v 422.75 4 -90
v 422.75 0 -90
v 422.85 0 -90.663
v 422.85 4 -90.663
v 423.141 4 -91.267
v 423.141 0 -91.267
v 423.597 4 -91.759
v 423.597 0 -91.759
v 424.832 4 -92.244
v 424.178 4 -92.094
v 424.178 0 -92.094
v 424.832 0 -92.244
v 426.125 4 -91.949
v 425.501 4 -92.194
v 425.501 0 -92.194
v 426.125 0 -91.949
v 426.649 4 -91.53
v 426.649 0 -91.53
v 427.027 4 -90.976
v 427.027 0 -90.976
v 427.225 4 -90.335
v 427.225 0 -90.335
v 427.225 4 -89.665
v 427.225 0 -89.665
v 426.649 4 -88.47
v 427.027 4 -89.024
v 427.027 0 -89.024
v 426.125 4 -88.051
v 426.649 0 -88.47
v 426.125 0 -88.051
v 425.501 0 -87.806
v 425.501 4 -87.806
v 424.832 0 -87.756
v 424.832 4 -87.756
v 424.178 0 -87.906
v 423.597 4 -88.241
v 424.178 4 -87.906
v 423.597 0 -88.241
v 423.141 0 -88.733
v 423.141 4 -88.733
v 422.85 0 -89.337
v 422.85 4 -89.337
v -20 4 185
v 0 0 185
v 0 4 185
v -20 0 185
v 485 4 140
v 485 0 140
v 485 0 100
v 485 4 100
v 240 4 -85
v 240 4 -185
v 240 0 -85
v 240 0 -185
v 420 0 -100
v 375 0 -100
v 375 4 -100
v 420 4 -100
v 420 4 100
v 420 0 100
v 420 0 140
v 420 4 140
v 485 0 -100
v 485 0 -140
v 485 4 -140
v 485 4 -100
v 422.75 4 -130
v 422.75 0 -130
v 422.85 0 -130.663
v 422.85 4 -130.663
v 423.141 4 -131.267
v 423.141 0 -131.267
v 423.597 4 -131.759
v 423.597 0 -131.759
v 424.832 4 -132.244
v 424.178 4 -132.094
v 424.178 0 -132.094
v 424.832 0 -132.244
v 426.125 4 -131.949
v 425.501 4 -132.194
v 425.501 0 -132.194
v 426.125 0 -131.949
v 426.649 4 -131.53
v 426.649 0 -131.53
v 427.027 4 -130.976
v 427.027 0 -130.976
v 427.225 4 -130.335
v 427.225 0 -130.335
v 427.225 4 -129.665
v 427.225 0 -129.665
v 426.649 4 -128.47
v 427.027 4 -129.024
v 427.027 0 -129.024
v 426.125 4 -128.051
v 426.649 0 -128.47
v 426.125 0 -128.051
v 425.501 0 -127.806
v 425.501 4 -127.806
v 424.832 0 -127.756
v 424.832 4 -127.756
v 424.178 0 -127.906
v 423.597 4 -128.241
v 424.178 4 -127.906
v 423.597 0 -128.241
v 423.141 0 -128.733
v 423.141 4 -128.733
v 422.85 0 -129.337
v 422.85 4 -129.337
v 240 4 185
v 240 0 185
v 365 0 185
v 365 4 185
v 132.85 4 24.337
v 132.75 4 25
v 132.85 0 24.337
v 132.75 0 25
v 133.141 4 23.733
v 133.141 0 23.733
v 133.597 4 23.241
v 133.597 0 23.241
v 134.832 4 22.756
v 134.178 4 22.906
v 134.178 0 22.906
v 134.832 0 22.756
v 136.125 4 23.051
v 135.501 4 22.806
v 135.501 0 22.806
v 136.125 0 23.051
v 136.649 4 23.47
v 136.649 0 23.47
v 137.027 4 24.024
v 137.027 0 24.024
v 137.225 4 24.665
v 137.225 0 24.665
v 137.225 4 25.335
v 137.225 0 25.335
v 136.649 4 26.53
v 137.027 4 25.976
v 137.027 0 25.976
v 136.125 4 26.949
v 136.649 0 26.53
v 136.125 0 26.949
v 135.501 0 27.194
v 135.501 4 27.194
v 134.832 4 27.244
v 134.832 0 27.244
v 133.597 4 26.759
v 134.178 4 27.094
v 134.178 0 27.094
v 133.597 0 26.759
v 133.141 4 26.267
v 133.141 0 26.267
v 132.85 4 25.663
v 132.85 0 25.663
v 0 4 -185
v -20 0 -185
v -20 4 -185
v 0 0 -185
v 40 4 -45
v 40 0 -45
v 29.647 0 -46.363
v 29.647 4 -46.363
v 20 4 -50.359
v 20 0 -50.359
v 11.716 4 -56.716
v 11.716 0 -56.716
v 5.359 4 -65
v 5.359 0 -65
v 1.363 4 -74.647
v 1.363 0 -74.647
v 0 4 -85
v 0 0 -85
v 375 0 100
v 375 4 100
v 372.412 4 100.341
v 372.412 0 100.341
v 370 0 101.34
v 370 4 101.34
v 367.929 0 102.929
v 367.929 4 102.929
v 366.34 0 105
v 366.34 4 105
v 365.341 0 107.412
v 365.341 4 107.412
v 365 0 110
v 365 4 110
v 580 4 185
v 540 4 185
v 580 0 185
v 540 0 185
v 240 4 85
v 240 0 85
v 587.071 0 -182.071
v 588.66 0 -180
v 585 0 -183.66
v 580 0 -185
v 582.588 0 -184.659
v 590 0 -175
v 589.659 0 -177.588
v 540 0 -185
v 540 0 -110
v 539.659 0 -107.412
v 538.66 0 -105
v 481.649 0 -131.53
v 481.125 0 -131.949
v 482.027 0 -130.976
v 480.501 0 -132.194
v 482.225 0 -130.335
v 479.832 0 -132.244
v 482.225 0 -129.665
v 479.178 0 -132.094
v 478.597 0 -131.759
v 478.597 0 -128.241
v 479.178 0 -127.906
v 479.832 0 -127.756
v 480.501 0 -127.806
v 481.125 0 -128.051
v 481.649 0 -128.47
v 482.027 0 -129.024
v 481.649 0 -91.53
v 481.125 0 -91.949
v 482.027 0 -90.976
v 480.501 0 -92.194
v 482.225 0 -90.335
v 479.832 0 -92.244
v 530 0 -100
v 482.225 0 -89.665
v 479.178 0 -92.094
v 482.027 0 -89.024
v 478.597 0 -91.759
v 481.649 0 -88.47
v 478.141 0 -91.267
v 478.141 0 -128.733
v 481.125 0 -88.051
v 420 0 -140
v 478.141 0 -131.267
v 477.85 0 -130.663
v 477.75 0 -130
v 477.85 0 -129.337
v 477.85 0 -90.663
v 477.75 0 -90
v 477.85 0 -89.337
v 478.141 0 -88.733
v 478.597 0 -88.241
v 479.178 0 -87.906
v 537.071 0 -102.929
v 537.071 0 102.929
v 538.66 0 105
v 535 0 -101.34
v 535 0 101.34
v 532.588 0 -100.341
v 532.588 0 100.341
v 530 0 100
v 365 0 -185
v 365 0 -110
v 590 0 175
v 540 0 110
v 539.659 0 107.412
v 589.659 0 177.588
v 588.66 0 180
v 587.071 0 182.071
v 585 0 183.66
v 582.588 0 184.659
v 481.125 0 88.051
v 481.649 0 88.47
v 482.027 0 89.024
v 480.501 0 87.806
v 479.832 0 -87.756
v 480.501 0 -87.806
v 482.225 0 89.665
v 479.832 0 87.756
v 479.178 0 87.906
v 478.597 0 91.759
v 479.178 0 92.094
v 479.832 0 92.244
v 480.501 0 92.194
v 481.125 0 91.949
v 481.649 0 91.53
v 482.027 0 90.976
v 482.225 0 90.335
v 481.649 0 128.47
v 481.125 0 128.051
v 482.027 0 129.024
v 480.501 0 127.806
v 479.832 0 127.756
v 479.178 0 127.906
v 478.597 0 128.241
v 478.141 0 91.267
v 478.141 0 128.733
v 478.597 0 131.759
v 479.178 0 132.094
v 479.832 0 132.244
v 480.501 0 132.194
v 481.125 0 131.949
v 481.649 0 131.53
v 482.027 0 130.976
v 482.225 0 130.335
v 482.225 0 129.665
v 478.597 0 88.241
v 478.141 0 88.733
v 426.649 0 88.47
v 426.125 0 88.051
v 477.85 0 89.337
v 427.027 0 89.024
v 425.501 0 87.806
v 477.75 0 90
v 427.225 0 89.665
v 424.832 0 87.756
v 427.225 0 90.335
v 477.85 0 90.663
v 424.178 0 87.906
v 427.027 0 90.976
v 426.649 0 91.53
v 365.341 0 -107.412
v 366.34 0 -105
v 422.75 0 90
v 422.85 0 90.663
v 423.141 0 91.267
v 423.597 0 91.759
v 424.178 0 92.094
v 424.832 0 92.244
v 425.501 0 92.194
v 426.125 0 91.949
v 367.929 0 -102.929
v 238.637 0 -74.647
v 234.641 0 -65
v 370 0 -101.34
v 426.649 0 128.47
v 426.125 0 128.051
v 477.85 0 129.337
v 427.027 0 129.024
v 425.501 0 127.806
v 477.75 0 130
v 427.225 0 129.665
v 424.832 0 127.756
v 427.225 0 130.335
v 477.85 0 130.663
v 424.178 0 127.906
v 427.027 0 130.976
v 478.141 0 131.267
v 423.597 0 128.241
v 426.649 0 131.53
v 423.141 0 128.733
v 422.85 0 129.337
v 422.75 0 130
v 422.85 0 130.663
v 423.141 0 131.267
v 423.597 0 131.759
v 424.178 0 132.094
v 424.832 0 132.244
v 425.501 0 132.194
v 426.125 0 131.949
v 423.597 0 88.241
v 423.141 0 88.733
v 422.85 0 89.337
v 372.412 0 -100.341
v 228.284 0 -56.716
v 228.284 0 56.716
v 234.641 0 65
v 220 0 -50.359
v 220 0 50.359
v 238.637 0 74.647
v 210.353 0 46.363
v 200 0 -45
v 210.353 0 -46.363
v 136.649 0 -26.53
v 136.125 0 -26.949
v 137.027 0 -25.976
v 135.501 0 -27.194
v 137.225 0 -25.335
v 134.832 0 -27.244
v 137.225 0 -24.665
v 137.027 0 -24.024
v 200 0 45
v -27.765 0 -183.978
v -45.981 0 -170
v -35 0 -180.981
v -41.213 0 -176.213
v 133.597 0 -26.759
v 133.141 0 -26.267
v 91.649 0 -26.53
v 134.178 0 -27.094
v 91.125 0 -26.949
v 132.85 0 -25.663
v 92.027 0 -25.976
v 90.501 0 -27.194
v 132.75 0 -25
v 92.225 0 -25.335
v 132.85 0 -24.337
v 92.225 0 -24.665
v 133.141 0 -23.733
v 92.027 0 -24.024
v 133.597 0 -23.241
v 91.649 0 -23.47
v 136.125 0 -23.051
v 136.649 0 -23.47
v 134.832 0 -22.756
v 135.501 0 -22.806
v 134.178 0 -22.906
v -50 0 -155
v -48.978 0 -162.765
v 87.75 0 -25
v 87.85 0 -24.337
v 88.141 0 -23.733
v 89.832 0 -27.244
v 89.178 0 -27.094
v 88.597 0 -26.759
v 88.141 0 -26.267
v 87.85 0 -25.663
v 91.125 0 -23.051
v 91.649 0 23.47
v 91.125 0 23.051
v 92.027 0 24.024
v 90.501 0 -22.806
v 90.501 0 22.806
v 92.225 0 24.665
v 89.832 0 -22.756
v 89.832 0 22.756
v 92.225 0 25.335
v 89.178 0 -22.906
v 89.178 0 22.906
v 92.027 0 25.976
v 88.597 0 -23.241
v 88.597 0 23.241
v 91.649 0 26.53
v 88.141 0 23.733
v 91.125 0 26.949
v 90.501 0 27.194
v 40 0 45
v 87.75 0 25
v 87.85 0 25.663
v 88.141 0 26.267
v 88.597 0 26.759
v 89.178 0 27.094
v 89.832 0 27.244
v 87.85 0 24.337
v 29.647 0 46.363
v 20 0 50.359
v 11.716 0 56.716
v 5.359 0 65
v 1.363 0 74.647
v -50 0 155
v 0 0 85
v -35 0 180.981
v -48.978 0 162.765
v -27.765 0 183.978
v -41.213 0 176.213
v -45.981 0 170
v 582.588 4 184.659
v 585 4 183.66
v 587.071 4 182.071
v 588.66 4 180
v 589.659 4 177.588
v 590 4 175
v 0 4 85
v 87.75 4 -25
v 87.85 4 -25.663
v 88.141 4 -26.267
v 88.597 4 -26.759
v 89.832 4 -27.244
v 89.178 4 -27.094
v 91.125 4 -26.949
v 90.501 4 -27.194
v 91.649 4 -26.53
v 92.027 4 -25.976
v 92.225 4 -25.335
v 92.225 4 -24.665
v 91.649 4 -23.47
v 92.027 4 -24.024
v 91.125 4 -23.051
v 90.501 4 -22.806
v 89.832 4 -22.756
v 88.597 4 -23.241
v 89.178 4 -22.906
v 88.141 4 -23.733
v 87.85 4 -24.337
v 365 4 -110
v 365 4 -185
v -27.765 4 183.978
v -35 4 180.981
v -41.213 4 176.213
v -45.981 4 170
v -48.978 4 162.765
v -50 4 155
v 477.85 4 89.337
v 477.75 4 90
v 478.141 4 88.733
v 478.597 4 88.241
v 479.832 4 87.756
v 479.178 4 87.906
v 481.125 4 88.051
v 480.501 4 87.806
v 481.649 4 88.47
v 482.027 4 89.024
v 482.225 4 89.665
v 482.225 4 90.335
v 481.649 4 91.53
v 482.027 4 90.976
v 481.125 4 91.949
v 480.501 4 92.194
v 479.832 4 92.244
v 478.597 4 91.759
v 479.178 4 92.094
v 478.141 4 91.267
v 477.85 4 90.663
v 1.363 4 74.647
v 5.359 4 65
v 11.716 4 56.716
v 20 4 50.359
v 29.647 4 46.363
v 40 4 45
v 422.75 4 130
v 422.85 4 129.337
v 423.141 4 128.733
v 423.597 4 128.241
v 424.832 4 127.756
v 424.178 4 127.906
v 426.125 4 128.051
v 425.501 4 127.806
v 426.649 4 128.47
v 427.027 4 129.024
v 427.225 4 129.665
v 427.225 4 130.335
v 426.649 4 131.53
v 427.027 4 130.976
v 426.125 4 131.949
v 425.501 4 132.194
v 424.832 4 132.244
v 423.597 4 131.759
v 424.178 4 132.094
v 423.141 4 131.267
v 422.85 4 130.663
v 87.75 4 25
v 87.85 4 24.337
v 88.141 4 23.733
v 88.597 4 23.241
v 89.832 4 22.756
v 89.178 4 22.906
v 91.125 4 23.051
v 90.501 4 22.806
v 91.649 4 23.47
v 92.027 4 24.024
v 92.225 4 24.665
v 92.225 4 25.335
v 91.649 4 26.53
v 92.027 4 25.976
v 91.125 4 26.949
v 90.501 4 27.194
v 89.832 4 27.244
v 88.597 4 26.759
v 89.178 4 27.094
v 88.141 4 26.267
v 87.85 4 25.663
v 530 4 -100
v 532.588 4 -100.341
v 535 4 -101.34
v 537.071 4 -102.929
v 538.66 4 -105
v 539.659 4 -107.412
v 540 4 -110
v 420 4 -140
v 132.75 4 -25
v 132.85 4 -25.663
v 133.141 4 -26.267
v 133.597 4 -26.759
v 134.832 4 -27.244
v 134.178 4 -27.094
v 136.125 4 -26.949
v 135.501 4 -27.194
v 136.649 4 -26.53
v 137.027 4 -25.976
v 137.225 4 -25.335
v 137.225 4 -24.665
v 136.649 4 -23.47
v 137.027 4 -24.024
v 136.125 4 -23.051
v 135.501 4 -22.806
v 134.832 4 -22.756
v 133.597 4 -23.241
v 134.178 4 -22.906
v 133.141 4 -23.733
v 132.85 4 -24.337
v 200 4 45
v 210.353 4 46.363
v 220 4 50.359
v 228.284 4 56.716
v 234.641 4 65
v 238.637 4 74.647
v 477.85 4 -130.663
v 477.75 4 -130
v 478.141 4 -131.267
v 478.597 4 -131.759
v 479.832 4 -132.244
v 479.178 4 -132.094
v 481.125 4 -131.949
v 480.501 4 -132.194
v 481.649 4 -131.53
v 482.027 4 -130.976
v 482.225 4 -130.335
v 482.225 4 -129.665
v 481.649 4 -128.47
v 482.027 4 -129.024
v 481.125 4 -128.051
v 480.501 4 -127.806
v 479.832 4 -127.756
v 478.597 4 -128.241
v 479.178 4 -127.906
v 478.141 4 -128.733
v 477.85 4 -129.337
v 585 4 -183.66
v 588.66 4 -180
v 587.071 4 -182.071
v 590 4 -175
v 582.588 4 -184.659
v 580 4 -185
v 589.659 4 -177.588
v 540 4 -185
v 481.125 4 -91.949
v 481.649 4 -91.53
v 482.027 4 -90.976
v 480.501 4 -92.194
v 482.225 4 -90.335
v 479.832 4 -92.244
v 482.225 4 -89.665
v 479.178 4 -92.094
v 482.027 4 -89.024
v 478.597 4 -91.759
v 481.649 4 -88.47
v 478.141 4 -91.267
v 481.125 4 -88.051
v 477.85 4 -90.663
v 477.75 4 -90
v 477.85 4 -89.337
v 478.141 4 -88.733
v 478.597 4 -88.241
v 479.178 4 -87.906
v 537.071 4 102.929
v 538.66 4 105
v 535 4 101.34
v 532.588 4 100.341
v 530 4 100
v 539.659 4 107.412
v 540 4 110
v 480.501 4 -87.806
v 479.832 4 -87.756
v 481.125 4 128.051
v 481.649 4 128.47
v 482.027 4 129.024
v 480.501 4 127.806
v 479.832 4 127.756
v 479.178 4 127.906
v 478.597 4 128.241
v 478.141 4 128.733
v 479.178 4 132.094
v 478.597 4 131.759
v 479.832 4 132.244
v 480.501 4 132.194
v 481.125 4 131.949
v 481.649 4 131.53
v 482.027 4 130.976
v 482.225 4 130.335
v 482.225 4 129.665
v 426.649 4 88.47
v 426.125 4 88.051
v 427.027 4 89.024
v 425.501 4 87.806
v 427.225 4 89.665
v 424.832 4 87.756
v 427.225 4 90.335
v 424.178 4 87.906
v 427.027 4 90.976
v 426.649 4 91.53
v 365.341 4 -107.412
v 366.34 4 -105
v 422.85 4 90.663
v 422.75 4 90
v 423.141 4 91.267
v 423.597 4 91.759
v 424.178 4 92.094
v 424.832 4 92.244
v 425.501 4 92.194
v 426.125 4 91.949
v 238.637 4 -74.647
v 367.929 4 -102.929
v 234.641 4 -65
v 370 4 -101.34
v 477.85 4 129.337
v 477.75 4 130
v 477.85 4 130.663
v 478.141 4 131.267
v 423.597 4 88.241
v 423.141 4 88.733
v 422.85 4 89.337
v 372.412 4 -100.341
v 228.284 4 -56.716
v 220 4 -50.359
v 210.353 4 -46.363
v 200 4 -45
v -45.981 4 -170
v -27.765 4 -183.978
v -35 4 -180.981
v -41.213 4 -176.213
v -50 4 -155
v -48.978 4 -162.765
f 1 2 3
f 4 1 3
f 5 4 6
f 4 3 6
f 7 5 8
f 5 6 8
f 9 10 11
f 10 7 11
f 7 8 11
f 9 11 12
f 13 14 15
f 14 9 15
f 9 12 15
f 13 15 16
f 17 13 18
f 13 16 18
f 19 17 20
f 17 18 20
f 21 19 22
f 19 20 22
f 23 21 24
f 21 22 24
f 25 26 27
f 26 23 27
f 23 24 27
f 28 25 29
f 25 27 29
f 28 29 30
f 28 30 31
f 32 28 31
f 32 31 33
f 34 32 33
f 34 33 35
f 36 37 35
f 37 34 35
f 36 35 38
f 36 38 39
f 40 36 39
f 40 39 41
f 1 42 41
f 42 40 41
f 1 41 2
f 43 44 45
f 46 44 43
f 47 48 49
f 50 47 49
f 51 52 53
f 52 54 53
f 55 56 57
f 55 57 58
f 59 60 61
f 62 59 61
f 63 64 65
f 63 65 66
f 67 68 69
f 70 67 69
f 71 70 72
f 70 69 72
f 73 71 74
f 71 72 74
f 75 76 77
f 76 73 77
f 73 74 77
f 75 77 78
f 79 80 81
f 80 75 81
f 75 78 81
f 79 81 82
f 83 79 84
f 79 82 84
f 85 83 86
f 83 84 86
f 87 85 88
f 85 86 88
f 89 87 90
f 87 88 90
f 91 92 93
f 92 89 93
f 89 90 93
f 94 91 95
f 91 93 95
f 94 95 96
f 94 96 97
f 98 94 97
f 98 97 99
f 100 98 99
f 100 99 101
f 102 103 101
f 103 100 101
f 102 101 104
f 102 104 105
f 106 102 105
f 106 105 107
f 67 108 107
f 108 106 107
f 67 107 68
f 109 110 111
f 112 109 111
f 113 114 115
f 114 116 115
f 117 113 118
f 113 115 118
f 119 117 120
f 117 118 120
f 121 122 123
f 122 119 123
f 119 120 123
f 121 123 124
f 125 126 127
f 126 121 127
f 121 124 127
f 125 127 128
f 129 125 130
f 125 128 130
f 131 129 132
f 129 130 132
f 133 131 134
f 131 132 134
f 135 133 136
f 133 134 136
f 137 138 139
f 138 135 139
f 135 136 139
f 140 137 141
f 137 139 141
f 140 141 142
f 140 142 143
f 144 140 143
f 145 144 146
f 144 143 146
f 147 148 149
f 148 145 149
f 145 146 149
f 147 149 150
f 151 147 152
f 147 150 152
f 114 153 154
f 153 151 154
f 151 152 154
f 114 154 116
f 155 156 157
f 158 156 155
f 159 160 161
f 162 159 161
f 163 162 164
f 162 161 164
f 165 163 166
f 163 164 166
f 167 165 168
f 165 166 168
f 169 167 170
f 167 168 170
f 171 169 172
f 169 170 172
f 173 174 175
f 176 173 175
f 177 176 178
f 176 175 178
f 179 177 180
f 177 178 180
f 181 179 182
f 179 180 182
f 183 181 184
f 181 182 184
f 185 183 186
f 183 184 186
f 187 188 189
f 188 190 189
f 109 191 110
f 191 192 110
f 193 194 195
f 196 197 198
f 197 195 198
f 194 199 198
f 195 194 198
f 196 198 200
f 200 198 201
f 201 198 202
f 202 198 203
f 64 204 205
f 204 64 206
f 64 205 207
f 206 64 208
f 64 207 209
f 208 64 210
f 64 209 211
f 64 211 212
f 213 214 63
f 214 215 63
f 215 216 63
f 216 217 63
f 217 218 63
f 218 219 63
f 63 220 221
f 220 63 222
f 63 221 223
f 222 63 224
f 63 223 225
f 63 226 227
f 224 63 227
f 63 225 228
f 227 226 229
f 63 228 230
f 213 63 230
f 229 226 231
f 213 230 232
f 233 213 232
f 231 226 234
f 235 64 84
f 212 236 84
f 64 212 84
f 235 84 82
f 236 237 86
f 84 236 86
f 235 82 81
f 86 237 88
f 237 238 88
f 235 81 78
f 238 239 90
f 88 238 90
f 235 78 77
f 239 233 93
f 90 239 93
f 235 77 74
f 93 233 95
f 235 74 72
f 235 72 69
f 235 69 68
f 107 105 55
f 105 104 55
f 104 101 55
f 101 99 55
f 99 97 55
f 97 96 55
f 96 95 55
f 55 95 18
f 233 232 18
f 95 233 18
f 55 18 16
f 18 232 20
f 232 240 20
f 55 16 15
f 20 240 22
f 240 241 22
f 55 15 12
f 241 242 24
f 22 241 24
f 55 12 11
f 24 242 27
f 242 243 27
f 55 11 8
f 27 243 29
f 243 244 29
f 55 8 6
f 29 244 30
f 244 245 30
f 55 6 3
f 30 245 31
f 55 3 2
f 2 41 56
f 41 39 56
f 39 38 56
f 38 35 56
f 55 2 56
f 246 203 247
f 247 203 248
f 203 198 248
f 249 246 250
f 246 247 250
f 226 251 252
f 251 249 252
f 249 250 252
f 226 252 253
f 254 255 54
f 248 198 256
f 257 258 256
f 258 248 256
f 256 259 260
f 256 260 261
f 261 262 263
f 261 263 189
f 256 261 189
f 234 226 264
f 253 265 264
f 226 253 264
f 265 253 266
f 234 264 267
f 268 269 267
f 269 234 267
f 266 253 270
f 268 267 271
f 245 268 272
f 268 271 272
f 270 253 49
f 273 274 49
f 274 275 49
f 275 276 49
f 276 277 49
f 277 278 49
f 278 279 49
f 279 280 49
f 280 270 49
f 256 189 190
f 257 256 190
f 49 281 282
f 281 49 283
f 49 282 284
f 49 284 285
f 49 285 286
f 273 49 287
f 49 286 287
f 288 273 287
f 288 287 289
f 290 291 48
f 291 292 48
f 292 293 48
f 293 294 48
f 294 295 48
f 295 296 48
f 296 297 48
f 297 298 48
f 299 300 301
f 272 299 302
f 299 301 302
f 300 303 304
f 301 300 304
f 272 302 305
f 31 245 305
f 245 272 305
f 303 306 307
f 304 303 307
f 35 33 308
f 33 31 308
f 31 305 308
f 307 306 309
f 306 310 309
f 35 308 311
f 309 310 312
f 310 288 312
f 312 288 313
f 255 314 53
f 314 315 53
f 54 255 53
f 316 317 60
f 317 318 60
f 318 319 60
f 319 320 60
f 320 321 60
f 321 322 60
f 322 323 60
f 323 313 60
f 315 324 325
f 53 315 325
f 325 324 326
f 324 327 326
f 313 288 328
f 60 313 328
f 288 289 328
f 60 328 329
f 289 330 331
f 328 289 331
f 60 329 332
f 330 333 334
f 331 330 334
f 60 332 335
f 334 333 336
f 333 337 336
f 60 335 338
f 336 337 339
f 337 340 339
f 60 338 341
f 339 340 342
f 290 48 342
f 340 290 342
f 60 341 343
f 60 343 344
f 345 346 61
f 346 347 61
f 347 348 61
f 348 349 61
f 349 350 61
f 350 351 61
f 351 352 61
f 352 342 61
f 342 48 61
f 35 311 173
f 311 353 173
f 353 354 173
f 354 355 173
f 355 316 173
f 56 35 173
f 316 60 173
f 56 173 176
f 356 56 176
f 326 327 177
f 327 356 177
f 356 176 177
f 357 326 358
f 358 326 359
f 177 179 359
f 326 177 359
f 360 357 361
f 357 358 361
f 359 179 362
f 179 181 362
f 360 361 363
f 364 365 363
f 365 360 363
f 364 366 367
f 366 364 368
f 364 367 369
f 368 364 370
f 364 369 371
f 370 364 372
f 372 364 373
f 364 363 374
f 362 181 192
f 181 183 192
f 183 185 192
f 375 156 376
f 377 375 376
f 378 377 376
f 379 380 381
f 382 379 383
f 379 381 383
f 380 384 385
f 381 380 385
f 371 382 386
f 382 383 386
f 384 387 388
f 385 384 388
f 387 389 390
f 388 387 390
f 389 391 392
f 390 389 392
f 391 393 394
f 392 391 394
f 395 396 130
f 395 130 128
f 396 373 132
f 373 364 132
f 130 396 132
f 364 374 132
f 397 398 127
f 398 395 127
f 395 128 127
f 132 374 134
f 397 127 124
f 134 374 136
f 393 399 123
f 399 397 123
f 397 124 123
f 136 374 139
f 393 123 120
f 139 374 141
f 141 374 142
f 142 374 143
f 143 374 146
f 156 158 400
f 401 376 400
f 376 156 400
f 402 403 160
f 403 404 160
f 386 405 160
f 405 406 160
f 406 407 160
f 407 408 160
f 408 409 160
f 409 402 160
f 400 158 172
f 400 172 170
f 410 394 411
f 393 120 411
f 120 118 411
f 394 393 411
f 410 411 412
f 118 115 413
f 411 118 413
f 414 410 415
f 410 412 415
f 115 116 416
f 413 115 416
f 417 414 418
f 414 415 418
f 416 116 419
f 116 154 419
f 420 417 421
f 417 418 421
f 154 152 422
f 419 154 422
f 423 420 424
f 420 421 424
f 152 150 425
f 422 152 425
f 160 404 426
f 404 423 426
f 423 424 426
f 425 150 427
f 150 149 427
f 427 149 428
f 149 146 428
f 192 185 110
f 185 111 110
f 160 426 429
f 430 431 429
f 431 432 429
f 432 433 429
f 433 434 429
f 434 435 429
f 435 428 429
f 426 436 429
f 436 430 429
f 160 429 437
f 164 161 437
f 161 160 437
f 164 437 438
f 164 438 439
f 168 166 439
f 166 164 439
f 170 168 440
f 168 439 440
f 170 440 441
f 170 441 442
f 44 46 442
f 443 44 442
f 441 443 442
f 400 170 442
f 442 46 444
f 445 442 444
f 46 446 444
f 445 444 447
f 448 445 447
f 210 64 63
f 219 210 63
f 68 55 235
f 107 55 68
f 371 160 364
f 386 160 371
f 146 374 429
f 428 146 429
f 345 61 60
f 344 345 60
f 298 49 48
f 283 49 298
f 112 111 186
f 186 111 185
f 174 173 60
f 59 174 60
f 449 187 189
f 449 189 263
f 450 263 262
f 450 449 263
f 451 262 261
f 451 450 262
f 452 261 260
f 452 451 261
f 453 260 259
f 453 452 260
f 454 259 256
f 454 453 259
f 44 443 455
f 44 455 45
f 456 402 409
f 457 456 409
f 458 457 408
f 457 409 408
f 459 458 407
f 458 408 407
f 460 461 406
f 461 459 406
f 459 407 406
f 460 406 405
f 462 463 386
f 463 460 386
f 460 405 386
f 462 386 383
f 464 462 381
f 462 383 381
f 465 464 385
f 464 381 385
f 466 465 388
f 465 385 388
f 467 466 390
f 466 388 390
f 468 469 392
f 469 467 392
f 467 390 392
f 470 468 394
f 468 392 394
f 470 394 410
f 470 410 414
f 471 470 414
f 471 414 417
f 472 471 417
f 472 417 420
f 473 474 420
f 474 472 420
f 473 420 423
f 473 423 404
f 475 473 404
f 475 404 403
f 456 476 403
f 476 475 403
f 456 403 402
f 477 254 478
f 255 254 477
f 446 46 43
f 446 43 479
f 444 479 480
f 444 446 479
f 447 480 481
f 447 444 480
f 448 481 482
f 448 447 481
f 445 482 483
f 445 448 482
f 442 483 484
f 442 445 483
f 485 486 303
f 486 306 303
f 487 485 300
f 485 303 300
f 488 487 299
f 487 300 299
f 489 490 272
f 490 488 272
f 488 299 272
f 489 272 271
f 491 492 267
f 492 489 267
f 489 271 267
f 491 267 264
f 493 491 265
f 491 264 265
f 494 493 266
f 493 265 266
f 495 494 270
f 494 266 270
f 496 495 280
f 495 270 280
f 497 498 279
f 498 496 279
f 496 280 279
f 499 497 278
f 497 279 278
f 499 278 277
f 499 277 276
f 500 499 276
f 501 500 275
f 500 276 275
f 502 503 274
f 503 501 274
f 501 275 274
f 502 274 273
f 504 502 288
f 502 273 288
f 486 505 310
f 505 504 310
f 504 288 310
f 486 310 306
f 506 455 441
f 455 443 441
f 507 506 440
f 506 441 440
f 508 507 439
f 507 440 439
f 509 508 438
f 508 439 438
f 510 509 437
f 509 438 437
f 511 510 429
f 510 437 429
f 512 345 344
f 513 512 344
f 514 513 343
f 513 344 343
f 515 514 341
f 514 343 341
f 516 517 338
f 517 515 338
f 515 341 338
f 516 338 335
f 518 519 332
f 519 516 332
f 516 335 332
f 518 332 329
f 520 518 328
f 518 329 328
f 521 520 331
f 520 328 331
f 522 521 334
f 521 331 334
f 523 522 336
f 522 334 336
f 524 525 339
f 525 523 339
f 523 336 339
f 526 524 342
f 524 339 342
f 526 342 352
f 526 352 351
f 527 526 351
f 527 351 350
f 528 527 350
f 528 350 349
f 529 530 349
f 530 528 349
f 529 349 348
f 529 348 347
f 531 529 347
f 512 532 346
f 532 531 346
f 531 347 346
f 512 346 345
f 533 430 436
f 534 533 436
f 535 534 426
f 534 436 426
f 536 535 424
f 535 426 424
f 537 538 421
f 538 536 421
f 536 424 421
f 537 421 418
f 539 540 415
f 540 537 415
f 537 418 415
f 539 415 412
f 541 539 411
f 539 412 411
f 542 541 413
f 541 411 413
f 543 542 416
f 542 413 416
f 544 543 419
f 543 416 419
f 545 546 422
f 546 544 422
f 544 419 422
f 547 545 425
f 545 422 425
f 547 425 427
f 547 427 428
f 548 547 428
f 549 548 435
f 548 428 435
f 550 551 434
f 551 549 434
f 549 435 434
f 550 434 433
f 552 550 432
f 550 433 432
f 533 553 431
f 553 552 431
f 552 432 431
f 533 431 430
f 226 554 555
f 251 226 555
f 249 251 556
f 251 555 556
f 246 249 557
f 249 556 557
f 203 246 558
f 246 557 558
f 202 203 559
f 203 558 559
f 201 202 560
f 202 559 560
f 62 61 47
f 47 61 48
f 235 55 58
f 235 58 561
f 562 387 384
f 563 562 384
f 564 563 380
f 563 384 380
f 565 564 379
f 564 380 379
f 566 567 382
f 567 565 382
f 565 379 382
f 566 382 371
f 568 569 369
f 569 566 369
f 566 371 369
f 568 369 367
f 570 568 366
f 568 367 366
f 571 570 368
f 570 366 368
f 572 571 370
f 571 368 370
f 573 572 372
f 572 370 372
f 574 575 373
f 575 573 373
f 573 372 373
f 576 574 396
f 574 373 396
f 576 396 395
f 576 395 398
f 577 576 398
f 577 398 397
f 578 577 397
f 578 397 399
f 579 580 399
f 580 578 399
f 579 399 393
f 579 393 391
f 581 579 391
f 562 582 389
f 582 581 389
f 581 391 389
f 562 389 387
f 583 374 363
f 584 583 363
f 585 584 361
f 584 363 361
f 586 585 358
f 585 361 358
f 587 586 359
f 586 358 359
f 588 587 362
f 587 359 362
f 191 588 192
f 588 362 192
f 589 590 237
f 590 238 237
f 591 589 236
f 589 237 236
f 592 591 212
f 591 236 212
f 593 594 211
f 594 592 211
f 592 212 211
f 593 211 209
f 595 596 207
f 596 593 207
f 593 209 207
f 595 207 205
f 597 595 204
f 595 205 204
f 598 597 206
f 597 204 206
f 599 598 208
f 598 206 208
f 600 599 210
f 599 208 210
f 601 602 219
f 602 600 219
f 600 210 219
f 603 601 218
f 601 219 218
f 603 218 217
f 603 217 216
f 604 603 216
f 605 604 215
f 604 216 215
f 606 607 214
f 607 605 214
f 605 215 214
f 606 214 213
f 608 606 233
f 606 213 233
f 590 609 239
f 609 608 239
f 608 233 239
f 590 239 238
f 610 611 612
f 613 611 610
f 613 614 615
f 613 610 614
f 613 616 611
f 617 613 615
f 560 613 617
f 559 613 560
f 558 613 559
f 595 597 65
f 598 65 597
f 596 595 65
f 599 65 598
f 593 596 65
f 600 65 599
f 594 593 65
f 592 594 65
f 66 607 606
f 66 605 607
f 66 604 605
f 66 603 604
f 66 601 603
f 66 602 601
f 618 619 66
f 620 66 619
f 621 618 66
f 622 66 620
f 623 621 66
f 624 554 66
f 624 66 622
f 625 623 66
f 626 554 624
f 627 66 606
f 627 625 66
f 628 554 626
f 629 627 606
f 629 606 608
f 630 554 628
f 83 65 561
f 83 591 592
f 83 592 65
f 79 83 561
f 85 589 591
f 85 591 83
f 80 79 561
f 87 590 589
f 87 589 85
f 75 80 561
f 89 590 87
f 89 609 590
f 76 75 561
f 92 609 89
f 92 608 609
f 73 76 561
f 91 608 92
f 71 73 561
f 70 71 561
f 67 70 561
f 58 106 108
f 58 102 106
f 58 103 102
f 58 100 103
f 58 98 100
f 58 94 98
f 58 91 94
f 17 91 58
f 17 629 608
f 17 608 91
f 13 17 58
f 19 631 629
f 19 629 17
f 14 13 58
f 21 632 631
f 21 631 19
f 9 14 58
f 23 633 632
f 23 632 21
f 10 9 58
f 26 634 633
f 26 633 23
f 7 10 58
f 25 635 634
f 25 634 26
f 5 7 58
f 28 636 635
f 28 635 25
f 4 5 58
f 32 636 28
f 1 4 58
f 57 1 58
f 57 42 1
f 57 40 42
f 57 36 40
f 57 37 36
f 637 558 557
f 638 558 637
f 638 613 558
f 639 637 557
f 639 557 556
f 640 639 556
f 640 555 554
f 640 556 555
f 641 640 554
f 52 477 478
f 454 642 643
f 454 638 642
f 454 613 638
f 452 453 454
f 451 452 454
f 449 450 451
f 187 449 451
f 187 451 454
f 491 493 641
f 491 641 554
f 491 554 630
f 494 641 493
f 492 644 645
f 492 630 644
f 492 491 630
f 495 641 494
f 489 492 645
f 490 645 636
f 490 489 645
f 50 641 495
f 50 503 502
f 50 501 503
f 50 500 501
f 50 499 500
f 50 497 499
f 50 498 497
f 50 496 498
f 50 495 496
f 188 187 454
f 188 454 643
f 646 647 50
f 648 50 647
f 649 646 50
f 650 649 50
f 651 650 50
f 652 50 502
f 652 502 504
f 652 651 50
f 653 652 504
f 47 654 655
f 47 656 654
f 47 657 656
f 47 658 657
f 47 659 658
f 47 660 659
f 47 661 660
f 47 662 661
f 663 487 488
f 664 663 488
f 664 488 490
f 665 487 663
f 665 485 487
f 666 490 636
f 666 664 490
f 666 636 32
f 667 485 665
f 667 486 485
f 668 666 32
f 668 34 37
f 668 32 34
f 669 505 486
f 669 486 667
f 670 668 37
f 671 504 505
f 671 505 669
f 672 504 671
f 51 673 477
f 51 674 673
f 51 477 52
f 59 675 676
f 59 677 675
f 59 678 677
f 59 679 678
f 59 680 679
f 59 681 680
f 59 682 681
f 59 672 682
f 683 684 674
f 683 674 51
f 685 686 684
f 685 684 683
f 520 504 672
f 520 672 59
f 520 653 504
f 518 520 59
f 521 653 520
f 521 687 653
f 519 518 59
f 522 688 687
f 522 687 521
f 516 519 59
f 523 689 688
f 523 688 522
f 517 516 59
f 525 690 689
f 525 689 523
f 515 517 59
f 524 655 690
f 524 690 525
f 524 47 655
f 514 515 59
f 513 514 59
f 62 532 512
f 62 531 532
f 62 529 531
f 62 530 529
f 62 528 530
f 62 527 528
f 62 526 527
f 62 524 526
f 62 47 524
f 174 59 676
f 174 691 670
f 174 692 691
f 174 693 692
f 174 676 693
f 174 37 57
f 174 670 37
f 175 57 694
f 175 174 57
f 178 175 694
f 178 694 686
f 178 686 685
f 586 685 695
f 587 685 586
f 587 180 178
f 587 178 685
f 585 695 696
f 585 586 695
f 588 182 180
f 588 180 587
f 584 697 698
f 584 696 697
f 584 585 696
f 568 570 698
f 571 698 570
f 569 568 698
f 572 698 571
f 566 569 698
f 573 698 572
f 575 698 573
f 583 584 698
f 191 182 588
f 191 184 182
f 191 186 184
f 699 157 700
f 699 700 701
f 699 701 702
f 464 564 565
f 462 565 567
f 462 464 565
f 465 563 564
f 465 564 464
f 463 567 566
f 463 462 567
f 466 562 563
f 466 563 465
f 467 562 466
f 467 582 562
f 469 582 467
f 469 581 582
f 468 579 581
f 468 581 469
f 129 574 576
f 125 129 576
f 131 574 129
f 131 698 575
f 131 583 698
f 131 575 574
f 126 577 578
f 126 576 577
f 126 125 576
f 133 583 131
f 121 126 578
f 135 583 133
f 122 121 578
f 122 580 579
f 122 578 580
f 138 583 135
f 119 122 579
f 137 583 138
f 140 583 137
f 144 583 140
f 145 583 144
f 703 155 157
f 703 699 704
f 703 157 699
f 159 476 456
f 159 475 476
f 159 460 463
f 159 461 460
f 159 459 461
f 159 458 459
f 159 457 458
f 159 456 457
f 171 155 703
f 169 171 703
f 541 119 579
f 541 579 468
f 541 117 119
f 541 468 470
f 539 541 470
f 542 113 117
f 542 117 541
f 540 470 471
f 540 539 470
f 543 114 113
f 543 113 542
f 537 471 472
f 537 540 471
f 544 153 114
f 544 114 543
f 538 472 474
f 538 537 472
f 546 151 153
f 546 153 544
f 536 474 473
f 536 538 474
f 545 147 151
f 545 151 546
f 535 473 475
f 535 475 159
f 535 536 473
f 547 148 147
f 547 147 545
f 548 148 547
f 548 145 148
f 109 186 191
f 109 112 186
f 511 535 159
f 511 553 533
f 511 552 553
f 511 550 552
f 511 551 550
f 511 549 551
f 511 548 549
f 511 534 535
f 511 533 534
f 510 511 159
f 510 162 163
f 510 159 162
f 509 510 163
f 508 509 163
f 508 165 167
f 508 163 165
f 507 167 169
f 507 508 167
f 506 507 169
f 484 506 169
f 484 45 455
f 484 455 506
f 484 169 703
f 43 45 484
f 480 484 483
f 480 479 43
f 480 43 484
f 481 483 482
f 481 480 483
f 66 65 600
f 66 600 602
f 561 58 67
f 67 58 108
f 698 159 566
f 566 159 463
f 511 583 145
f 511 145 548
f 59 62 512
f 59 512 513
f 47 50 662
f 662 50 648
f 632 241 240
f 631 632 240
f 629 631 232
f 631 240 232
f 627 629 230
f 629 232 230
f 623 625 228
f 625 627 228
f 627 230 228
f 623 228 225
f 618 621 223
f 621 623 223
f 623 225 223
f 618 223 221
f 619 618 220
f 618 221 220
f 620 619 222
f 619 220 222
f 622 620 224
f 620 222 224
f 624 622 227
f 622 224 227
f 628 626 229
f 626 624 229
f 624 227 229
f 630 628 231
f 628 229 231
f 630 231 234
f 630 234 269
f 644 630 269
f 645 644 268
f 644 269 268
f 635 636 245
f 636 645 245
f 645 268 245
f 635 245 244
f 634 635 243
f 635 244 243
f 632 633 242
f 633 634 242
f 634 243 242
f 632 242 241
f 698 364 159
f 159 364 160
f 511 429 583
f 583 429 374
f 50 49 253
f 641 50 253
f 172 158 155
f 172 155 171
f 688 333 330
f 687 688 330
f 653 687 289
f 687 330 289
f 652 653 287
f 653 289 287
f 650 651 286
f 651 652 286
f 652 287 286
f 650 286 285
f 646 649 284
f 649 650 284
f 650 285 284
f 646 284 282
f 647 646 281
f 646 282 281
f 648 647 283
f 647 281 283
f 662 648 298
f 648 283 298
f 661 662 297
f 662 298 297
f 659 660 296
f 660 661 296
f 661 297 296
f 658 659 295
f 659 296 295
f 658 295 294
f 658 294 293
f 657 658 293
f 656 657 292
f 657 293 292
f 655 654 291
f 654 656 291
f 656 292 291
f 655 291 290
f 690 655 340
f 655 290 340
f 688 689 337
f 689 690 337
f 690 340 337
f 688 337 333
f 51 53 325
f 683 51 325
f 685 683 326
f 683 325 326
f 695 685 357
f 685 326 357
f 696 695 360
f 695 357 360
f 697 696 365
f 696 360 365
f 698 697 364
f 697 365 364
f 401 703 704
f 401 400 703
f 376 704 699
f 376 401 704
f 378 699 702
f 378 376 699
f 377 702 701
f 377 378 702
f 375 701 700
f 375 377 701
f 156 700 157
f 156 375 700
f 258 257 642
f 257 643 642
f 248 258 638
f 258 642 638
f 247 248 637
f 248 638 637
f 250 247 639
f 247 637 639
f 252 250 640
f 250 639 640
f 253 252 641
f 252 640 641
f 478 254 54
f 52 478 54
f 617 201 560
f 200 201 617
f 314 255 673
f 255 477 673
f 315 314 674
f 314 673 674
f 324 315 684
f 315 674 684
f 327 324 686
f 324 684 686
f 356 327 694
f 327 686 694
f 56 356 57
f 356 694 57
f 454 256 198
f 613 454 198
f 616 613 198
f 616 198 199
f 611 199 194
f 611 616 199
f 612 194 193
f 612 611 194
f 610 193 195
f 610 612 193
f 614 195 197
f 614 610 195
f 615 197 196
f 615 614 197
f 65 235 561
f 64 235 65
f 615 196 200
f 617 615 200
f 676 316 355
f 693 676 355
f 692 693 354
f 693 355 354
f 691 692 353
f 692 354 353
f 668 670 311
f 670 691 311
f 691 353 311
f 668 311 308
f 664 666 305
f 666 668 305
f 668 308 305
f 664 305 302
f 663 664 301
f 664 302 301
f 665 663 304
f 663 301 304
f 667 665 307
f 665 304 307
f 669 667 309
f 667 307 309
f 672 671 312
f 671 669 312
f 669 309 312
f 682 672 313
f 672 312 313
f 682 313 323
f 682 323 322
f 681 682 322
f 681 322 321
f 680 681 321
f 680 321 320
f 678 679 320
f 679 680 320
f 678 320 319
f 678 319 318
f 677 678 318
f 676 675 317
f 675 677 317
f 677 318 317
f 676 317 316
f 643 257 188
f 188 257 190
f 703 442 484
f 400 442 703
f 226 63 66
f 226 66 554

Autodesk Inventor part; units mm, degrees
ref_plane "YZ Plane" through (0, 0, 0) normal (1, 0, 0) x (0, 1, 0)
ref_plane "XZ Plane" through (0, 0, 0) normal (0, 1, 0) x (-1, 0, 0)
ref_plane "XY Plane" through (0, 0, 0) normal (0, 0, 1) x (1, 0, 0)
sketch "Эскиз1" plane through (0, 0, 0) normal (0, 1, 0) x (-1, 0, 0)
  line L0 (0, 0) -> (62.2951, 0) construction
  line L1 (-40, 45) -> (-200, 45)
  line L2 (-200, -45) -> (-40, -45)
  circle A0 centre (-90, 25) radius 2.25
  line L3 (-90, 25) -> (-135, 25) construction
  circle A1 centre (-135, 25) radius 2.25
  circle A2 centre (-90, -25) radius 2.25
  circle A3 centre (-135, -25) radius 2.25
  line L4 (0, 185) -> (20, 185)
  line L5 (50, 155) -> (50, -155)
  line L6 (20, -185) -> (0, -185)
  line L7 (0, 85) -> (0, 185)
  arc A4 (50, 155) -> (20, 185) centre (20, 155) ccw
  arc A5 (20, -185) -> (50, -155) centre (20, -155) ccw
  line L8 (-240, 185) -> (-365, 185)
  line L9 (-590, 185) -> (-590, -185)
  line L10 (-590, -185) -> (-540, -185)
  line L11 (-240, 85) -> (-240, 185)
  arc A6 (-40, 45) -> (0, 85) centre (-40, 85) ccw
  line L12 (0, -185) -> (0, -85)
  arc A7 (0, -85) -> (-40, -45) centre (-40, -85) ccw
  arc A8 (-240, 85) -> (-200, 45) centre (-200, 85) ccw
  line L13 (-240, -185) -> (-240, -85)
  arc A9 (-200, -45) -> (-240, -85) centre (-200, -85) ccw
  line L14 (-365, 185) -> (-365, 100)
  line L15 (-365, 100) -> (-420, 100)
  line L16 (-420, 100) -> (-420, 140)
  line L17 (-420, 140) -> (-485, 140)
  line L18 (-485, 140) -> (-485, 100)
  line L19 (-485, 100) -> (-540, 100)
  line L20 (-540, 100) -> (-540, 185)
  line L21 (-495.3156, 130) -> (-414.5161, 130) construction
  circle A10 centre (-480, 130) radius 2.25
  circle A11 centre (-425, 130) radius 2.25
  line L22 (-452.5, 140) -> (-452.5, 103.3214) construction
  circle A12 centre (-480, 90) radius 2.25
  circle A13 centre (-425, 90) radius 2.25
  line L23 (-540, 185) -> (-590, 185)
  line L24 (-365, 185) -> (-540, 185) construction
  line L25 (-365, -185) -> (-365, -100)
  line L26 (-365, -100) -> (-420, -100)
  line L27 (-420, -100) -> (-420, -140)
  line L28 (-420, -140) -> (-485, -140)
  line L29 (-485, -140) -> (-485, -100)
  line L30 (-485, -100) -> (-540, -100)
  line L31 (-540, -100) -> (-540, -185)
  circle A14 centre (-480, -130) radius 2.25
  circle A15 centre (-425, -130) radius 2.25
  circle A16 centre (-480, -90) radius 2.25
  circle A17 centre (-425, -90) radius 2.25
  line L32 (-540, -185) -> (-365, -185) construction
  line L33 (-365, -185) -> (-240, -185)
  point P0 (50, 185)
  dimension "d10" = 4.5
  dimension "d11" = 45
  dimension "d12" = 25
  dimension "d13" = 90
  dimension "d14" = 50
  dimension "d15" = 370
  dimension "d16" = 30
  dimension "d20" = 350
  dimension "d21" = 40
  dimension "d22" = 40
  dimension "d23" = 90
  dimension "d24" = 40
  dimension "d25" = 40
  dimension "d26" = 240
  dimension "d27" = 50
  dimension "d28" = 55
  dimension "d29" = 45
  dimension "d30" = 65
  dimension "d31" = 55
  dimension "d32" = 85
  dimension "d33" = 4.5
  dimension "d34" = 55
  dimension "d35" = 10
  dimension "d38" = 40
extrude "Выдавливание3" add sketch "Эскиз1" along normal blind 4
fillet "Сопряжение1" radius 10 4 edges at (365, 2, 100) (540, 2, 100) (540, 2, -100) (365, 2, -100)
fillet "Сопряжение2" radius 10 2 edges at (590, 2, -185) (590, 2, 185)
equation "\"d22\" = d21"
equation "\"d24\" = d21"
equation "\"d25\" = d21"
properties part number "00-01-Платформа"
